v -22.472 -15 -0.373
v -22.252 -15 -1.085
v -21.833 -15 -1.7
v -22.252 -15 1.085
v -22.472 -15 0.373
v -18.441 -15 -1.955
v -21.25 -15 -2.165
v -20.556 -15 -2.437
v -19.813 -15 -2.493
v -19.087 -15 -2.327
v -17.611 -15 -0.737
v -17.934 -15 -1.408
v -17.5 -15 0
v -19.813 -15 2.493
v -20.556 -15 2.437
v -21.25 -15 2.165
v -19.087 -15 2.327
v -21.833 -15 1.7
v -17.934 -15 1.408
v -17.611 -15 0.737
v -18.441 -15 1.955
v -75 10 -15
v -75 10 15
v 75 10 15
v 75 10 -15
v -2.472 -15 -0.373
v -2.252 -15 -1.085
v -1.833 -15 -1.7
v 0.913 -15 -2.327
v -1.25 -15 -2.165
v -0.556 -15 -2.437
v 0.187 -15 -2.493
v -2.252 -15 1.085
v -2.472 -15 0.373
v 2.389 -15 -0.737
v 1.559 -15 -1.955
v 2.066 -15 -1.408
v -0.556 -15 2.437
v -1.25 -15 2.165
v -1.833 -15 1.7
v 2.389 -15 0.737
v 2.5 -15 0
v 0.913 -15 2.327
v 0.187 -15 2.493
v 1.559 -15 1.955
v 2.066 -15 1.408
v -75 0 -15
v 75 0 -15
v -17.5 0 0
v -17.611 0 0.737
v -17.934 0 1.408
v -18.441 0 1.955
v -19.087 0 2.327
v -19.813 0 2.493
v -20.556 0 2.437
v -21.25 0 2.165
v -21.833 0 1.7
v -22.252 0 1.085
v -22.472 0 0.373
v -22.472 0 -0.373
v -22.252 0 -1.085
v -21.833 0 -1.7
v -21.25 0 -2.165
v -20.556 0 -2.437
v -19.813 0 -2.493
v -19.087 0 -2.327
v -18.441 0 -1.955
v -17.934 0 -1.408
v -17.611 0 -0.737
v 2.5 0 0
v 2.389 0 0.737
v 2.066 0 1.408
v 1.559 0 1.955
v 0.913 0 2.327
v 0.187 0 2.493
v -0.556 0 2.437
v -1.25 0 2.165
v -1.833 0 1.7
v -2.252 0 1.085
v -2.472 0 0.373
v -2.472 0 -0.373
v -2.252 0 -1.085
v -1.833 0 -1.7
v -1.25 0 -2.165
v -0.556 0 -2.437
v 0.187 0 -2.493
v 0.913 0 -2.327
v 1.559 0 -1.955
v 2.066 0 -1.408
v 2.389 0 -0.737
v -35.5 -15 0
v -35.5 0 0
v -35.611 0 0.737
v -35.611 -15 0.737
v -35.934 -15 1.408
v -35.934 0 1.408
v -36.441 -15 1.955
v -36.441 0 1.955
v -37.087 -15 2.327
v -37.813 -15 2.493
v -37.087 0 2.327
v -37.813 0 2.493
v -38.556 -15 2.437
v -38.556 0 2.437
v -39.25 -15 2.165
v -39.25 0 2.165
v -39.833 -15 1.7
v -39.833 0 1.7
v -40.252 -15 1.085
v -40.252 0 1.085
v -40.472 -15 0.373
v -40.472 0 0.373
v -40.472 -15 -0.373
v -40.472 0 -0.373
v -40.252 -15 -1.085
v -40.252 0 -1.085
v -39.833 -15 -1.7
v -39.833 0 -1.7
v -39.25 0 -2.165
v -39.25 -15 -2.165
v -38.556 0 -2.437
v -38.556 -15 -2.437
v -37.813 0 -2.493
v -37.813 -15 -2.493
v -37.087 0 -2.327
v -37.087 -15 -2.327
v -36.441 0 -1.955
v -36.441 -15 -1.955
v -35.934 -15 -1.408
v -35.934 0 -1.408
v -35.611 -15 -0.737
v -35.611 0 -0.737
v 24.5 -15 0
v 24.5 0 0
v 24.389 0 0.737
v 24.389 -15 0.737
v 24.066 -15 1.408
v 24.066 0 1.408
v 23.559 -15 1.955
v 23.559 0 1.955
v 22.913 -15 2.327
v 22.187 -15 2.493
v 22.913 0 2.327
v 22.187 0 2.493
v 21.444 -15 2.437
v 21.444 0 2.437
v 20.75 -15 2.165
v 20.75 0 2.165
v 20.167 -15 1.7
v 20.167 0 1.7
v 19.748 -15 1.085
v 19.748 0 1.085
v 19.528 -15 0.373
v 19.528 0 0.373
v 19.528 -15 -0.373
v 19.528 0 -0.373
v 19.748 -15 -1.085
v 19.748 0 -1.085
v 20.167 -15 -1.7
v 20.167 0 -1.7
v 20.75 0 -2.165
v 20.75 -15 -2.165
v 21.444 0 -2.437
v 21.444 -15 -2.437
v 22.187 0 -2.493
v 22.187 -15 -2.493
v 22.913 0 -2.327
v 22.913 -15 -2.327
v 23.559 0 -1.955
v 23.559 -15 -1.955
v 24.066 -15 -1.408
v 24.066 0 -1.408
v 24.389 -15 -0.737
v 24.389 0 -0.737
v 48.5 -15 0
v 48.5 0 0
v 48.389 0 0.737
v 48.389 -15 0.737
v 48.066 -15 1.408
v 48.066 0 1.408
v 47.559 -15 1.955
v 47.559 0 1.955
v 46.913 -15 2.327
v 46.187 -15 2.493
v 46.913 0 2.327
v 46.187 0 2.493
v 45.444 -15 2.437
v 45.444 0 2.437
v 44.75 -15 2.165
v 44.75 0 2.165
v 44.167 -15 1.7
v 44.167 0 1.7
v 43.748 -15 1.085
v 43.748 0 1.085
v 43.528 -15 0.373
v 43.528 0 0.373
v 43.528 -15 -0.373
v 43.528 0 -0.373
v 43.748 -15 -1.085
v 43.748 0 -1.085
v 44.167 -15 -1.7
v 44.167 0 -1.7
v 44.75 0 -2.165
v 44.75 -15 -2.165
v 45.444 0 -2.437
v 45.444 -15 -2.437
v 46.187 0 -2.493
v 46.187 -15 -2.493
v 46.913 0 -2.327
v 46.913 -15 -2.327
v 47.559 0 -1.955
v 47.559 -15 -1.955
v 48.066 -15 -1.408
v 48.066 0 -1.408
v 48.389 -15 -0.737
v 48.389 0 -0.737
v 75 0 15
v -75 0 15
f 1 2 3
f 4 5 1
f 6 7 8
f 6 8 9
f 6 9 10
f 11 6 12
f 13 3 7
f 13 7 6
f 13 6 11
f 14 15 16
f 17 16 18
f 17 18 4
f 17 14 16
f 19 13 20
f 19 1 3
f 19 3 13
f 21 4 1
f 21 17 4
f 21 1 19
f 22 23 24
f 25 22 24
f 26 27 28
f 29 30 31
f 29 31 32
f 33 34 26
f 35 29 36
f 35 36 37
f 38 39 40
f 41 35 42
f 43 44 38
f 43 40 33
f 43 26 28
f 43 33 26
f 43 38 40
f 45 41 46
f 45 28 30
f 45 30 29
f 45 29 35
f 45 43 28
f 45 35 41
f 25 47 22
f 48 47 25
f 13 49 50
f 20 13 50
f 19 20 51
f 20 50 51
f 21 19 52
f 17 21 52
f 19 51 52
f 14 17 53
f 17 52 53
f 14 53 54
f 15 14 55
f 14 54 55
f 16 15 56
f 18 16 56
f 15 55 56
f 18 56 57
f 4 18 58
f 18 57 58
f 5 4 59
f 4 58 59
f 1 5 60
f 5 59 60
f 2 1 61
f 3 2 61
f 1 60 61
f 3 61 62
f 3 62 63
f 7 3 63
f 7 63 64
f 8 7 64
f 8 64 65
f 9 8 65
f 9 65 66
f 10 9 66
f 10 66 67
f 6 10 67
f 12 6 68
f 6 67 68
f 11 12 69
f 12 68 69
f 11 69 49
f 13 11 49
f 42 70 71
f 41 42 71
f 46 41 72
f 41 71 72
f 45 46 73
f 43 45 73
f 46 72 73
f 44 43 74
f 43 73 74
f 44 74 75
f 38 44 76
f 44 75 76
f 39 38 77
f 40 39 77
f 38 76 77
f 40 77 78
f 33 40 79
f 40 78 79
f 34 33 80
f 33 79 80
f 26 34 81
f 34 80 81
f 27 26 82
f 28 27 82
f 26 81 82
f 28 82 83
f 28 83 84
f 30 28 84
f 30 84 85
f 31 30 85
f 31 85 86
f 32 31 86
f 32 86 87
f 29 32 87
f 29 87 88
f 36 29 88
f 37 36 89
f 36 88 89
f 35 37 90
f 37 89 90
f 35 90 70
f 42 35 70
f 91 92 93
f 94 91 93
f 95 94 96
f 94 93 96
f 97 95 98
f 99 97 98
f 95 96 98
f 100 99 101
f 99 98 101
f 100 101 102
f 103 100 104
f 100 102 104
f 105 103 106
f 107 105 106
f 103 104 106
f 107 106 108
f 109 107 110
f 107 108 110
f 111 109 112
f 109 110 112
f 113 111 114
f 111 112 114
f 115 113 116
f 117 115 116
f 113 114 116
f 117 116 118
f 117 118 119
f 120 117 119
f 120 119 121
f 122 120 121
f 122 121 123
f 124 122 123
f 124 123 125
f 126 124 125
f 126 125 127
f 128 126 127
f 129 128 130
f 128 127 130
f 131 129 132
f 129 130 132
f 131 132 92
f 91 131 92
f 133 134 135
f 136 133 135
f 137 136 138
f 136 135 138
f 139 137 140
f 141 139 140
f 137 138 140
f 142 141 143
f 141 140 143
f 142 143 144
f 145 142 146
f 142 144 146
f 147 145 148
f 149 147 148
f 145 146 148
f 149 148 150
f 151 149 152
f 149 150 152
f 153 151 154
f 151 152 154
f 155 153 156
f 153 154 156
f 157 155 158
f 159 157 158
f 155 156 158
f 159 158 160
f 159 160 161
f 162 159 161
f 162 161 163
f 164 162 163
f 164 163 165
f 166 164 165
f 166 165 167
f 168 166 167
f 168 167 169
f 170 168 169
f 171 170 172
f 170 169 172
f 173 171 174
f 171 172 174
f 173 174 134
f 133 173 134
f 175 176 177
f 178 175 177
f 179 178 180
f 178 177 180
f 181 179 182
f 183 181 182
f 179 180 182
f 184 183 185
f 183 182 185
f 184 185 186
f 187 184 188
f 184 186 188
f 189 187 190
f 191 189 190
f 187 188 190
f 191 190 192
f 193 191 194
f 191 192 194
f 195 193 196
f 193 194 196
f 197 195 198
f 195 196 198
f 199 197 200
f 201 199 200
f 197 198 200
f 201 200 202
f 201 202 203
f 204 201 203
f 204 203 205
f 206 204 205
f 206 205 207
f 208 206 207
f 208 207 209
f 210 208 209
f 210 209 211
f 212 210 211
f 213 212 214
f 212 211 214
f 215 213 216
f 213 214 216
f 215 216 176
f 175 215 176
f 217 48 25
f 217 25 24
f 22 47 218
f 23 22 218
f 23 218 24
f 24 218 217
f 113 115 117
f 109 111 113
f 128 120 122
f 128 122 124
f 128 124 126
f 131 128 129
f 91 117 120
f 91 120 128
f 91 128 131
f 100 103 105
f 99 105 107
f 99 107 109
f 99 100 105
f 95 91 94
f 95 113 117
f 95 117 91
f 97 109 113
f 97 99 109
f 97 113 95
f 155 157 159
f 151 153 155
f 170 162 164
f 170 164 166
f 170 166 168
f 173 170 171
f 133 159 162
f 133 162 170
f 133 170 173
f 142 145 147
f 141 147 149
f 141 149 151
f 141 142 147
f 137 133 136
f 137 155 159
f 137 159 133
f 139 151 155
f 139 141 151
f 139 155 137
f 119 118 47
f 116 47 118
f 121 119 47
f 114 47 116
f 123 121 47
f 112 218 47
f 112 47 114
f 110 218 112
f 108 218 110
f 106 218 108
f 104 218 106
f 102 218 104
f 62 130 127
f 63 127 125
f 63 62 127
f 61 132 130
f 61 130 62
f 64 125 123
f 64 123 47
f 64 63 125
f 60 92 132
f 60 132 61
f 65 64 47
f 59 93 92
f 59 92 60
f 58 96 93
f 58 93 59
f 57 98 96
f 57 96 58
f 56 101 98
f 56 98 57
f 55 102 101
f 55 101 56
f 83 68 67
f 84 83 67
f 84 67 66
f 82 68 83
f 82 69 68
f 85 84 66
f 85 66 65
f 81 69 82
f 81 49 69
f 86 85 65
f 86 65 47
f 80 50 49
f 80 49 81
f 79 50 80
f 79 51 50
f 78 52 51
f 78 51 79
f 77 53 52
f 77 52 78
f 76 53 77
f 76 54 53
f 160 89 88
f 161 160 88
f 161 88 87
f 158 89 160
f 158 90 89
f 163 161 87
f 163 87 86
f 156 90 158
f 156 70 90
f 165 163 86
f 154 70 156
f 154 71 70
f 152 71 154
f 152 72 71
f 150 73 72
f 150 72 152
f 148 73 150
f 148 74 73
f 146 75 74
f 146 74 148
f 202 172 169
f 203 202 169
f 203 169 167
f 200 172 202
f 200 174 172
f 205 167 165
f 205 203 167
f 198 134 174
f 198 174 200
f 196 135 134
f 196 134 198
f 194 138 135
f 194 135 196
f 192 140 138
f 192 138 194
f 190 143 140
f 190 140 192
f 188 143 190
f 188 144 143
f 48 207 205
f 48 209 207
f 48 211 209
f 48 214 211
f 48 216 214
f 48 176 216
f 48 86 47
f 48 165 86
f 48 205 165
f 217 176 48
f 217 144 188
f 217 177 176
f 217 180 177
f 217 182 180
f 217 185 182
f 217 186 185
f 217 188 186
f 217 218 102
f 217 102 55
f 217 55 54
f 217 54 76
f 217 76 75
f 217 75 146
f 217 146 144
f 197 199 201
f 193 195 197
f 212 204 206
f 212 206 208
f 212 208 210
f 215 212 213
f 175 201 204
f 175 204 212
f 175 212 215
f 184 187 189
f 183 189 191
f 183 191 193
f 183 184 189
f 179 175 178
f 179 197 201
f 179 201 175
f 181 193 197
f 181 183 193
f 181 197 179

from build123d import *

# Parameters (mm, degrees)
F0_W     = 150
F0_H     = 30
F1_DEPTH = 10
F2_R     = 2.5
F3_DEPTH = 15


with BuildPart() as f1:
    # F0 (on Front) → F1 (new body)
    with BuildSketch(Plane.XZ):
        Rectangle(F0_W, F0_H)
    extrude(amount=-F1_DEPTH)

    # F2 (on face) → F3 (join)
    with BuildSketch(Plane.XZ):
        with Locations((-38, 0)):
            Circle(F2_R)
        with Locations((-20, 0)):
            Circle(F2_R)
        Circle(F2_R)
        with Locations((22, 0)):
            Circle(F2_R)
        with Locations((46, 0)):
            Circle(F2_R)
    extrude(amount=F3_DEPTH)


solid = f1.part
